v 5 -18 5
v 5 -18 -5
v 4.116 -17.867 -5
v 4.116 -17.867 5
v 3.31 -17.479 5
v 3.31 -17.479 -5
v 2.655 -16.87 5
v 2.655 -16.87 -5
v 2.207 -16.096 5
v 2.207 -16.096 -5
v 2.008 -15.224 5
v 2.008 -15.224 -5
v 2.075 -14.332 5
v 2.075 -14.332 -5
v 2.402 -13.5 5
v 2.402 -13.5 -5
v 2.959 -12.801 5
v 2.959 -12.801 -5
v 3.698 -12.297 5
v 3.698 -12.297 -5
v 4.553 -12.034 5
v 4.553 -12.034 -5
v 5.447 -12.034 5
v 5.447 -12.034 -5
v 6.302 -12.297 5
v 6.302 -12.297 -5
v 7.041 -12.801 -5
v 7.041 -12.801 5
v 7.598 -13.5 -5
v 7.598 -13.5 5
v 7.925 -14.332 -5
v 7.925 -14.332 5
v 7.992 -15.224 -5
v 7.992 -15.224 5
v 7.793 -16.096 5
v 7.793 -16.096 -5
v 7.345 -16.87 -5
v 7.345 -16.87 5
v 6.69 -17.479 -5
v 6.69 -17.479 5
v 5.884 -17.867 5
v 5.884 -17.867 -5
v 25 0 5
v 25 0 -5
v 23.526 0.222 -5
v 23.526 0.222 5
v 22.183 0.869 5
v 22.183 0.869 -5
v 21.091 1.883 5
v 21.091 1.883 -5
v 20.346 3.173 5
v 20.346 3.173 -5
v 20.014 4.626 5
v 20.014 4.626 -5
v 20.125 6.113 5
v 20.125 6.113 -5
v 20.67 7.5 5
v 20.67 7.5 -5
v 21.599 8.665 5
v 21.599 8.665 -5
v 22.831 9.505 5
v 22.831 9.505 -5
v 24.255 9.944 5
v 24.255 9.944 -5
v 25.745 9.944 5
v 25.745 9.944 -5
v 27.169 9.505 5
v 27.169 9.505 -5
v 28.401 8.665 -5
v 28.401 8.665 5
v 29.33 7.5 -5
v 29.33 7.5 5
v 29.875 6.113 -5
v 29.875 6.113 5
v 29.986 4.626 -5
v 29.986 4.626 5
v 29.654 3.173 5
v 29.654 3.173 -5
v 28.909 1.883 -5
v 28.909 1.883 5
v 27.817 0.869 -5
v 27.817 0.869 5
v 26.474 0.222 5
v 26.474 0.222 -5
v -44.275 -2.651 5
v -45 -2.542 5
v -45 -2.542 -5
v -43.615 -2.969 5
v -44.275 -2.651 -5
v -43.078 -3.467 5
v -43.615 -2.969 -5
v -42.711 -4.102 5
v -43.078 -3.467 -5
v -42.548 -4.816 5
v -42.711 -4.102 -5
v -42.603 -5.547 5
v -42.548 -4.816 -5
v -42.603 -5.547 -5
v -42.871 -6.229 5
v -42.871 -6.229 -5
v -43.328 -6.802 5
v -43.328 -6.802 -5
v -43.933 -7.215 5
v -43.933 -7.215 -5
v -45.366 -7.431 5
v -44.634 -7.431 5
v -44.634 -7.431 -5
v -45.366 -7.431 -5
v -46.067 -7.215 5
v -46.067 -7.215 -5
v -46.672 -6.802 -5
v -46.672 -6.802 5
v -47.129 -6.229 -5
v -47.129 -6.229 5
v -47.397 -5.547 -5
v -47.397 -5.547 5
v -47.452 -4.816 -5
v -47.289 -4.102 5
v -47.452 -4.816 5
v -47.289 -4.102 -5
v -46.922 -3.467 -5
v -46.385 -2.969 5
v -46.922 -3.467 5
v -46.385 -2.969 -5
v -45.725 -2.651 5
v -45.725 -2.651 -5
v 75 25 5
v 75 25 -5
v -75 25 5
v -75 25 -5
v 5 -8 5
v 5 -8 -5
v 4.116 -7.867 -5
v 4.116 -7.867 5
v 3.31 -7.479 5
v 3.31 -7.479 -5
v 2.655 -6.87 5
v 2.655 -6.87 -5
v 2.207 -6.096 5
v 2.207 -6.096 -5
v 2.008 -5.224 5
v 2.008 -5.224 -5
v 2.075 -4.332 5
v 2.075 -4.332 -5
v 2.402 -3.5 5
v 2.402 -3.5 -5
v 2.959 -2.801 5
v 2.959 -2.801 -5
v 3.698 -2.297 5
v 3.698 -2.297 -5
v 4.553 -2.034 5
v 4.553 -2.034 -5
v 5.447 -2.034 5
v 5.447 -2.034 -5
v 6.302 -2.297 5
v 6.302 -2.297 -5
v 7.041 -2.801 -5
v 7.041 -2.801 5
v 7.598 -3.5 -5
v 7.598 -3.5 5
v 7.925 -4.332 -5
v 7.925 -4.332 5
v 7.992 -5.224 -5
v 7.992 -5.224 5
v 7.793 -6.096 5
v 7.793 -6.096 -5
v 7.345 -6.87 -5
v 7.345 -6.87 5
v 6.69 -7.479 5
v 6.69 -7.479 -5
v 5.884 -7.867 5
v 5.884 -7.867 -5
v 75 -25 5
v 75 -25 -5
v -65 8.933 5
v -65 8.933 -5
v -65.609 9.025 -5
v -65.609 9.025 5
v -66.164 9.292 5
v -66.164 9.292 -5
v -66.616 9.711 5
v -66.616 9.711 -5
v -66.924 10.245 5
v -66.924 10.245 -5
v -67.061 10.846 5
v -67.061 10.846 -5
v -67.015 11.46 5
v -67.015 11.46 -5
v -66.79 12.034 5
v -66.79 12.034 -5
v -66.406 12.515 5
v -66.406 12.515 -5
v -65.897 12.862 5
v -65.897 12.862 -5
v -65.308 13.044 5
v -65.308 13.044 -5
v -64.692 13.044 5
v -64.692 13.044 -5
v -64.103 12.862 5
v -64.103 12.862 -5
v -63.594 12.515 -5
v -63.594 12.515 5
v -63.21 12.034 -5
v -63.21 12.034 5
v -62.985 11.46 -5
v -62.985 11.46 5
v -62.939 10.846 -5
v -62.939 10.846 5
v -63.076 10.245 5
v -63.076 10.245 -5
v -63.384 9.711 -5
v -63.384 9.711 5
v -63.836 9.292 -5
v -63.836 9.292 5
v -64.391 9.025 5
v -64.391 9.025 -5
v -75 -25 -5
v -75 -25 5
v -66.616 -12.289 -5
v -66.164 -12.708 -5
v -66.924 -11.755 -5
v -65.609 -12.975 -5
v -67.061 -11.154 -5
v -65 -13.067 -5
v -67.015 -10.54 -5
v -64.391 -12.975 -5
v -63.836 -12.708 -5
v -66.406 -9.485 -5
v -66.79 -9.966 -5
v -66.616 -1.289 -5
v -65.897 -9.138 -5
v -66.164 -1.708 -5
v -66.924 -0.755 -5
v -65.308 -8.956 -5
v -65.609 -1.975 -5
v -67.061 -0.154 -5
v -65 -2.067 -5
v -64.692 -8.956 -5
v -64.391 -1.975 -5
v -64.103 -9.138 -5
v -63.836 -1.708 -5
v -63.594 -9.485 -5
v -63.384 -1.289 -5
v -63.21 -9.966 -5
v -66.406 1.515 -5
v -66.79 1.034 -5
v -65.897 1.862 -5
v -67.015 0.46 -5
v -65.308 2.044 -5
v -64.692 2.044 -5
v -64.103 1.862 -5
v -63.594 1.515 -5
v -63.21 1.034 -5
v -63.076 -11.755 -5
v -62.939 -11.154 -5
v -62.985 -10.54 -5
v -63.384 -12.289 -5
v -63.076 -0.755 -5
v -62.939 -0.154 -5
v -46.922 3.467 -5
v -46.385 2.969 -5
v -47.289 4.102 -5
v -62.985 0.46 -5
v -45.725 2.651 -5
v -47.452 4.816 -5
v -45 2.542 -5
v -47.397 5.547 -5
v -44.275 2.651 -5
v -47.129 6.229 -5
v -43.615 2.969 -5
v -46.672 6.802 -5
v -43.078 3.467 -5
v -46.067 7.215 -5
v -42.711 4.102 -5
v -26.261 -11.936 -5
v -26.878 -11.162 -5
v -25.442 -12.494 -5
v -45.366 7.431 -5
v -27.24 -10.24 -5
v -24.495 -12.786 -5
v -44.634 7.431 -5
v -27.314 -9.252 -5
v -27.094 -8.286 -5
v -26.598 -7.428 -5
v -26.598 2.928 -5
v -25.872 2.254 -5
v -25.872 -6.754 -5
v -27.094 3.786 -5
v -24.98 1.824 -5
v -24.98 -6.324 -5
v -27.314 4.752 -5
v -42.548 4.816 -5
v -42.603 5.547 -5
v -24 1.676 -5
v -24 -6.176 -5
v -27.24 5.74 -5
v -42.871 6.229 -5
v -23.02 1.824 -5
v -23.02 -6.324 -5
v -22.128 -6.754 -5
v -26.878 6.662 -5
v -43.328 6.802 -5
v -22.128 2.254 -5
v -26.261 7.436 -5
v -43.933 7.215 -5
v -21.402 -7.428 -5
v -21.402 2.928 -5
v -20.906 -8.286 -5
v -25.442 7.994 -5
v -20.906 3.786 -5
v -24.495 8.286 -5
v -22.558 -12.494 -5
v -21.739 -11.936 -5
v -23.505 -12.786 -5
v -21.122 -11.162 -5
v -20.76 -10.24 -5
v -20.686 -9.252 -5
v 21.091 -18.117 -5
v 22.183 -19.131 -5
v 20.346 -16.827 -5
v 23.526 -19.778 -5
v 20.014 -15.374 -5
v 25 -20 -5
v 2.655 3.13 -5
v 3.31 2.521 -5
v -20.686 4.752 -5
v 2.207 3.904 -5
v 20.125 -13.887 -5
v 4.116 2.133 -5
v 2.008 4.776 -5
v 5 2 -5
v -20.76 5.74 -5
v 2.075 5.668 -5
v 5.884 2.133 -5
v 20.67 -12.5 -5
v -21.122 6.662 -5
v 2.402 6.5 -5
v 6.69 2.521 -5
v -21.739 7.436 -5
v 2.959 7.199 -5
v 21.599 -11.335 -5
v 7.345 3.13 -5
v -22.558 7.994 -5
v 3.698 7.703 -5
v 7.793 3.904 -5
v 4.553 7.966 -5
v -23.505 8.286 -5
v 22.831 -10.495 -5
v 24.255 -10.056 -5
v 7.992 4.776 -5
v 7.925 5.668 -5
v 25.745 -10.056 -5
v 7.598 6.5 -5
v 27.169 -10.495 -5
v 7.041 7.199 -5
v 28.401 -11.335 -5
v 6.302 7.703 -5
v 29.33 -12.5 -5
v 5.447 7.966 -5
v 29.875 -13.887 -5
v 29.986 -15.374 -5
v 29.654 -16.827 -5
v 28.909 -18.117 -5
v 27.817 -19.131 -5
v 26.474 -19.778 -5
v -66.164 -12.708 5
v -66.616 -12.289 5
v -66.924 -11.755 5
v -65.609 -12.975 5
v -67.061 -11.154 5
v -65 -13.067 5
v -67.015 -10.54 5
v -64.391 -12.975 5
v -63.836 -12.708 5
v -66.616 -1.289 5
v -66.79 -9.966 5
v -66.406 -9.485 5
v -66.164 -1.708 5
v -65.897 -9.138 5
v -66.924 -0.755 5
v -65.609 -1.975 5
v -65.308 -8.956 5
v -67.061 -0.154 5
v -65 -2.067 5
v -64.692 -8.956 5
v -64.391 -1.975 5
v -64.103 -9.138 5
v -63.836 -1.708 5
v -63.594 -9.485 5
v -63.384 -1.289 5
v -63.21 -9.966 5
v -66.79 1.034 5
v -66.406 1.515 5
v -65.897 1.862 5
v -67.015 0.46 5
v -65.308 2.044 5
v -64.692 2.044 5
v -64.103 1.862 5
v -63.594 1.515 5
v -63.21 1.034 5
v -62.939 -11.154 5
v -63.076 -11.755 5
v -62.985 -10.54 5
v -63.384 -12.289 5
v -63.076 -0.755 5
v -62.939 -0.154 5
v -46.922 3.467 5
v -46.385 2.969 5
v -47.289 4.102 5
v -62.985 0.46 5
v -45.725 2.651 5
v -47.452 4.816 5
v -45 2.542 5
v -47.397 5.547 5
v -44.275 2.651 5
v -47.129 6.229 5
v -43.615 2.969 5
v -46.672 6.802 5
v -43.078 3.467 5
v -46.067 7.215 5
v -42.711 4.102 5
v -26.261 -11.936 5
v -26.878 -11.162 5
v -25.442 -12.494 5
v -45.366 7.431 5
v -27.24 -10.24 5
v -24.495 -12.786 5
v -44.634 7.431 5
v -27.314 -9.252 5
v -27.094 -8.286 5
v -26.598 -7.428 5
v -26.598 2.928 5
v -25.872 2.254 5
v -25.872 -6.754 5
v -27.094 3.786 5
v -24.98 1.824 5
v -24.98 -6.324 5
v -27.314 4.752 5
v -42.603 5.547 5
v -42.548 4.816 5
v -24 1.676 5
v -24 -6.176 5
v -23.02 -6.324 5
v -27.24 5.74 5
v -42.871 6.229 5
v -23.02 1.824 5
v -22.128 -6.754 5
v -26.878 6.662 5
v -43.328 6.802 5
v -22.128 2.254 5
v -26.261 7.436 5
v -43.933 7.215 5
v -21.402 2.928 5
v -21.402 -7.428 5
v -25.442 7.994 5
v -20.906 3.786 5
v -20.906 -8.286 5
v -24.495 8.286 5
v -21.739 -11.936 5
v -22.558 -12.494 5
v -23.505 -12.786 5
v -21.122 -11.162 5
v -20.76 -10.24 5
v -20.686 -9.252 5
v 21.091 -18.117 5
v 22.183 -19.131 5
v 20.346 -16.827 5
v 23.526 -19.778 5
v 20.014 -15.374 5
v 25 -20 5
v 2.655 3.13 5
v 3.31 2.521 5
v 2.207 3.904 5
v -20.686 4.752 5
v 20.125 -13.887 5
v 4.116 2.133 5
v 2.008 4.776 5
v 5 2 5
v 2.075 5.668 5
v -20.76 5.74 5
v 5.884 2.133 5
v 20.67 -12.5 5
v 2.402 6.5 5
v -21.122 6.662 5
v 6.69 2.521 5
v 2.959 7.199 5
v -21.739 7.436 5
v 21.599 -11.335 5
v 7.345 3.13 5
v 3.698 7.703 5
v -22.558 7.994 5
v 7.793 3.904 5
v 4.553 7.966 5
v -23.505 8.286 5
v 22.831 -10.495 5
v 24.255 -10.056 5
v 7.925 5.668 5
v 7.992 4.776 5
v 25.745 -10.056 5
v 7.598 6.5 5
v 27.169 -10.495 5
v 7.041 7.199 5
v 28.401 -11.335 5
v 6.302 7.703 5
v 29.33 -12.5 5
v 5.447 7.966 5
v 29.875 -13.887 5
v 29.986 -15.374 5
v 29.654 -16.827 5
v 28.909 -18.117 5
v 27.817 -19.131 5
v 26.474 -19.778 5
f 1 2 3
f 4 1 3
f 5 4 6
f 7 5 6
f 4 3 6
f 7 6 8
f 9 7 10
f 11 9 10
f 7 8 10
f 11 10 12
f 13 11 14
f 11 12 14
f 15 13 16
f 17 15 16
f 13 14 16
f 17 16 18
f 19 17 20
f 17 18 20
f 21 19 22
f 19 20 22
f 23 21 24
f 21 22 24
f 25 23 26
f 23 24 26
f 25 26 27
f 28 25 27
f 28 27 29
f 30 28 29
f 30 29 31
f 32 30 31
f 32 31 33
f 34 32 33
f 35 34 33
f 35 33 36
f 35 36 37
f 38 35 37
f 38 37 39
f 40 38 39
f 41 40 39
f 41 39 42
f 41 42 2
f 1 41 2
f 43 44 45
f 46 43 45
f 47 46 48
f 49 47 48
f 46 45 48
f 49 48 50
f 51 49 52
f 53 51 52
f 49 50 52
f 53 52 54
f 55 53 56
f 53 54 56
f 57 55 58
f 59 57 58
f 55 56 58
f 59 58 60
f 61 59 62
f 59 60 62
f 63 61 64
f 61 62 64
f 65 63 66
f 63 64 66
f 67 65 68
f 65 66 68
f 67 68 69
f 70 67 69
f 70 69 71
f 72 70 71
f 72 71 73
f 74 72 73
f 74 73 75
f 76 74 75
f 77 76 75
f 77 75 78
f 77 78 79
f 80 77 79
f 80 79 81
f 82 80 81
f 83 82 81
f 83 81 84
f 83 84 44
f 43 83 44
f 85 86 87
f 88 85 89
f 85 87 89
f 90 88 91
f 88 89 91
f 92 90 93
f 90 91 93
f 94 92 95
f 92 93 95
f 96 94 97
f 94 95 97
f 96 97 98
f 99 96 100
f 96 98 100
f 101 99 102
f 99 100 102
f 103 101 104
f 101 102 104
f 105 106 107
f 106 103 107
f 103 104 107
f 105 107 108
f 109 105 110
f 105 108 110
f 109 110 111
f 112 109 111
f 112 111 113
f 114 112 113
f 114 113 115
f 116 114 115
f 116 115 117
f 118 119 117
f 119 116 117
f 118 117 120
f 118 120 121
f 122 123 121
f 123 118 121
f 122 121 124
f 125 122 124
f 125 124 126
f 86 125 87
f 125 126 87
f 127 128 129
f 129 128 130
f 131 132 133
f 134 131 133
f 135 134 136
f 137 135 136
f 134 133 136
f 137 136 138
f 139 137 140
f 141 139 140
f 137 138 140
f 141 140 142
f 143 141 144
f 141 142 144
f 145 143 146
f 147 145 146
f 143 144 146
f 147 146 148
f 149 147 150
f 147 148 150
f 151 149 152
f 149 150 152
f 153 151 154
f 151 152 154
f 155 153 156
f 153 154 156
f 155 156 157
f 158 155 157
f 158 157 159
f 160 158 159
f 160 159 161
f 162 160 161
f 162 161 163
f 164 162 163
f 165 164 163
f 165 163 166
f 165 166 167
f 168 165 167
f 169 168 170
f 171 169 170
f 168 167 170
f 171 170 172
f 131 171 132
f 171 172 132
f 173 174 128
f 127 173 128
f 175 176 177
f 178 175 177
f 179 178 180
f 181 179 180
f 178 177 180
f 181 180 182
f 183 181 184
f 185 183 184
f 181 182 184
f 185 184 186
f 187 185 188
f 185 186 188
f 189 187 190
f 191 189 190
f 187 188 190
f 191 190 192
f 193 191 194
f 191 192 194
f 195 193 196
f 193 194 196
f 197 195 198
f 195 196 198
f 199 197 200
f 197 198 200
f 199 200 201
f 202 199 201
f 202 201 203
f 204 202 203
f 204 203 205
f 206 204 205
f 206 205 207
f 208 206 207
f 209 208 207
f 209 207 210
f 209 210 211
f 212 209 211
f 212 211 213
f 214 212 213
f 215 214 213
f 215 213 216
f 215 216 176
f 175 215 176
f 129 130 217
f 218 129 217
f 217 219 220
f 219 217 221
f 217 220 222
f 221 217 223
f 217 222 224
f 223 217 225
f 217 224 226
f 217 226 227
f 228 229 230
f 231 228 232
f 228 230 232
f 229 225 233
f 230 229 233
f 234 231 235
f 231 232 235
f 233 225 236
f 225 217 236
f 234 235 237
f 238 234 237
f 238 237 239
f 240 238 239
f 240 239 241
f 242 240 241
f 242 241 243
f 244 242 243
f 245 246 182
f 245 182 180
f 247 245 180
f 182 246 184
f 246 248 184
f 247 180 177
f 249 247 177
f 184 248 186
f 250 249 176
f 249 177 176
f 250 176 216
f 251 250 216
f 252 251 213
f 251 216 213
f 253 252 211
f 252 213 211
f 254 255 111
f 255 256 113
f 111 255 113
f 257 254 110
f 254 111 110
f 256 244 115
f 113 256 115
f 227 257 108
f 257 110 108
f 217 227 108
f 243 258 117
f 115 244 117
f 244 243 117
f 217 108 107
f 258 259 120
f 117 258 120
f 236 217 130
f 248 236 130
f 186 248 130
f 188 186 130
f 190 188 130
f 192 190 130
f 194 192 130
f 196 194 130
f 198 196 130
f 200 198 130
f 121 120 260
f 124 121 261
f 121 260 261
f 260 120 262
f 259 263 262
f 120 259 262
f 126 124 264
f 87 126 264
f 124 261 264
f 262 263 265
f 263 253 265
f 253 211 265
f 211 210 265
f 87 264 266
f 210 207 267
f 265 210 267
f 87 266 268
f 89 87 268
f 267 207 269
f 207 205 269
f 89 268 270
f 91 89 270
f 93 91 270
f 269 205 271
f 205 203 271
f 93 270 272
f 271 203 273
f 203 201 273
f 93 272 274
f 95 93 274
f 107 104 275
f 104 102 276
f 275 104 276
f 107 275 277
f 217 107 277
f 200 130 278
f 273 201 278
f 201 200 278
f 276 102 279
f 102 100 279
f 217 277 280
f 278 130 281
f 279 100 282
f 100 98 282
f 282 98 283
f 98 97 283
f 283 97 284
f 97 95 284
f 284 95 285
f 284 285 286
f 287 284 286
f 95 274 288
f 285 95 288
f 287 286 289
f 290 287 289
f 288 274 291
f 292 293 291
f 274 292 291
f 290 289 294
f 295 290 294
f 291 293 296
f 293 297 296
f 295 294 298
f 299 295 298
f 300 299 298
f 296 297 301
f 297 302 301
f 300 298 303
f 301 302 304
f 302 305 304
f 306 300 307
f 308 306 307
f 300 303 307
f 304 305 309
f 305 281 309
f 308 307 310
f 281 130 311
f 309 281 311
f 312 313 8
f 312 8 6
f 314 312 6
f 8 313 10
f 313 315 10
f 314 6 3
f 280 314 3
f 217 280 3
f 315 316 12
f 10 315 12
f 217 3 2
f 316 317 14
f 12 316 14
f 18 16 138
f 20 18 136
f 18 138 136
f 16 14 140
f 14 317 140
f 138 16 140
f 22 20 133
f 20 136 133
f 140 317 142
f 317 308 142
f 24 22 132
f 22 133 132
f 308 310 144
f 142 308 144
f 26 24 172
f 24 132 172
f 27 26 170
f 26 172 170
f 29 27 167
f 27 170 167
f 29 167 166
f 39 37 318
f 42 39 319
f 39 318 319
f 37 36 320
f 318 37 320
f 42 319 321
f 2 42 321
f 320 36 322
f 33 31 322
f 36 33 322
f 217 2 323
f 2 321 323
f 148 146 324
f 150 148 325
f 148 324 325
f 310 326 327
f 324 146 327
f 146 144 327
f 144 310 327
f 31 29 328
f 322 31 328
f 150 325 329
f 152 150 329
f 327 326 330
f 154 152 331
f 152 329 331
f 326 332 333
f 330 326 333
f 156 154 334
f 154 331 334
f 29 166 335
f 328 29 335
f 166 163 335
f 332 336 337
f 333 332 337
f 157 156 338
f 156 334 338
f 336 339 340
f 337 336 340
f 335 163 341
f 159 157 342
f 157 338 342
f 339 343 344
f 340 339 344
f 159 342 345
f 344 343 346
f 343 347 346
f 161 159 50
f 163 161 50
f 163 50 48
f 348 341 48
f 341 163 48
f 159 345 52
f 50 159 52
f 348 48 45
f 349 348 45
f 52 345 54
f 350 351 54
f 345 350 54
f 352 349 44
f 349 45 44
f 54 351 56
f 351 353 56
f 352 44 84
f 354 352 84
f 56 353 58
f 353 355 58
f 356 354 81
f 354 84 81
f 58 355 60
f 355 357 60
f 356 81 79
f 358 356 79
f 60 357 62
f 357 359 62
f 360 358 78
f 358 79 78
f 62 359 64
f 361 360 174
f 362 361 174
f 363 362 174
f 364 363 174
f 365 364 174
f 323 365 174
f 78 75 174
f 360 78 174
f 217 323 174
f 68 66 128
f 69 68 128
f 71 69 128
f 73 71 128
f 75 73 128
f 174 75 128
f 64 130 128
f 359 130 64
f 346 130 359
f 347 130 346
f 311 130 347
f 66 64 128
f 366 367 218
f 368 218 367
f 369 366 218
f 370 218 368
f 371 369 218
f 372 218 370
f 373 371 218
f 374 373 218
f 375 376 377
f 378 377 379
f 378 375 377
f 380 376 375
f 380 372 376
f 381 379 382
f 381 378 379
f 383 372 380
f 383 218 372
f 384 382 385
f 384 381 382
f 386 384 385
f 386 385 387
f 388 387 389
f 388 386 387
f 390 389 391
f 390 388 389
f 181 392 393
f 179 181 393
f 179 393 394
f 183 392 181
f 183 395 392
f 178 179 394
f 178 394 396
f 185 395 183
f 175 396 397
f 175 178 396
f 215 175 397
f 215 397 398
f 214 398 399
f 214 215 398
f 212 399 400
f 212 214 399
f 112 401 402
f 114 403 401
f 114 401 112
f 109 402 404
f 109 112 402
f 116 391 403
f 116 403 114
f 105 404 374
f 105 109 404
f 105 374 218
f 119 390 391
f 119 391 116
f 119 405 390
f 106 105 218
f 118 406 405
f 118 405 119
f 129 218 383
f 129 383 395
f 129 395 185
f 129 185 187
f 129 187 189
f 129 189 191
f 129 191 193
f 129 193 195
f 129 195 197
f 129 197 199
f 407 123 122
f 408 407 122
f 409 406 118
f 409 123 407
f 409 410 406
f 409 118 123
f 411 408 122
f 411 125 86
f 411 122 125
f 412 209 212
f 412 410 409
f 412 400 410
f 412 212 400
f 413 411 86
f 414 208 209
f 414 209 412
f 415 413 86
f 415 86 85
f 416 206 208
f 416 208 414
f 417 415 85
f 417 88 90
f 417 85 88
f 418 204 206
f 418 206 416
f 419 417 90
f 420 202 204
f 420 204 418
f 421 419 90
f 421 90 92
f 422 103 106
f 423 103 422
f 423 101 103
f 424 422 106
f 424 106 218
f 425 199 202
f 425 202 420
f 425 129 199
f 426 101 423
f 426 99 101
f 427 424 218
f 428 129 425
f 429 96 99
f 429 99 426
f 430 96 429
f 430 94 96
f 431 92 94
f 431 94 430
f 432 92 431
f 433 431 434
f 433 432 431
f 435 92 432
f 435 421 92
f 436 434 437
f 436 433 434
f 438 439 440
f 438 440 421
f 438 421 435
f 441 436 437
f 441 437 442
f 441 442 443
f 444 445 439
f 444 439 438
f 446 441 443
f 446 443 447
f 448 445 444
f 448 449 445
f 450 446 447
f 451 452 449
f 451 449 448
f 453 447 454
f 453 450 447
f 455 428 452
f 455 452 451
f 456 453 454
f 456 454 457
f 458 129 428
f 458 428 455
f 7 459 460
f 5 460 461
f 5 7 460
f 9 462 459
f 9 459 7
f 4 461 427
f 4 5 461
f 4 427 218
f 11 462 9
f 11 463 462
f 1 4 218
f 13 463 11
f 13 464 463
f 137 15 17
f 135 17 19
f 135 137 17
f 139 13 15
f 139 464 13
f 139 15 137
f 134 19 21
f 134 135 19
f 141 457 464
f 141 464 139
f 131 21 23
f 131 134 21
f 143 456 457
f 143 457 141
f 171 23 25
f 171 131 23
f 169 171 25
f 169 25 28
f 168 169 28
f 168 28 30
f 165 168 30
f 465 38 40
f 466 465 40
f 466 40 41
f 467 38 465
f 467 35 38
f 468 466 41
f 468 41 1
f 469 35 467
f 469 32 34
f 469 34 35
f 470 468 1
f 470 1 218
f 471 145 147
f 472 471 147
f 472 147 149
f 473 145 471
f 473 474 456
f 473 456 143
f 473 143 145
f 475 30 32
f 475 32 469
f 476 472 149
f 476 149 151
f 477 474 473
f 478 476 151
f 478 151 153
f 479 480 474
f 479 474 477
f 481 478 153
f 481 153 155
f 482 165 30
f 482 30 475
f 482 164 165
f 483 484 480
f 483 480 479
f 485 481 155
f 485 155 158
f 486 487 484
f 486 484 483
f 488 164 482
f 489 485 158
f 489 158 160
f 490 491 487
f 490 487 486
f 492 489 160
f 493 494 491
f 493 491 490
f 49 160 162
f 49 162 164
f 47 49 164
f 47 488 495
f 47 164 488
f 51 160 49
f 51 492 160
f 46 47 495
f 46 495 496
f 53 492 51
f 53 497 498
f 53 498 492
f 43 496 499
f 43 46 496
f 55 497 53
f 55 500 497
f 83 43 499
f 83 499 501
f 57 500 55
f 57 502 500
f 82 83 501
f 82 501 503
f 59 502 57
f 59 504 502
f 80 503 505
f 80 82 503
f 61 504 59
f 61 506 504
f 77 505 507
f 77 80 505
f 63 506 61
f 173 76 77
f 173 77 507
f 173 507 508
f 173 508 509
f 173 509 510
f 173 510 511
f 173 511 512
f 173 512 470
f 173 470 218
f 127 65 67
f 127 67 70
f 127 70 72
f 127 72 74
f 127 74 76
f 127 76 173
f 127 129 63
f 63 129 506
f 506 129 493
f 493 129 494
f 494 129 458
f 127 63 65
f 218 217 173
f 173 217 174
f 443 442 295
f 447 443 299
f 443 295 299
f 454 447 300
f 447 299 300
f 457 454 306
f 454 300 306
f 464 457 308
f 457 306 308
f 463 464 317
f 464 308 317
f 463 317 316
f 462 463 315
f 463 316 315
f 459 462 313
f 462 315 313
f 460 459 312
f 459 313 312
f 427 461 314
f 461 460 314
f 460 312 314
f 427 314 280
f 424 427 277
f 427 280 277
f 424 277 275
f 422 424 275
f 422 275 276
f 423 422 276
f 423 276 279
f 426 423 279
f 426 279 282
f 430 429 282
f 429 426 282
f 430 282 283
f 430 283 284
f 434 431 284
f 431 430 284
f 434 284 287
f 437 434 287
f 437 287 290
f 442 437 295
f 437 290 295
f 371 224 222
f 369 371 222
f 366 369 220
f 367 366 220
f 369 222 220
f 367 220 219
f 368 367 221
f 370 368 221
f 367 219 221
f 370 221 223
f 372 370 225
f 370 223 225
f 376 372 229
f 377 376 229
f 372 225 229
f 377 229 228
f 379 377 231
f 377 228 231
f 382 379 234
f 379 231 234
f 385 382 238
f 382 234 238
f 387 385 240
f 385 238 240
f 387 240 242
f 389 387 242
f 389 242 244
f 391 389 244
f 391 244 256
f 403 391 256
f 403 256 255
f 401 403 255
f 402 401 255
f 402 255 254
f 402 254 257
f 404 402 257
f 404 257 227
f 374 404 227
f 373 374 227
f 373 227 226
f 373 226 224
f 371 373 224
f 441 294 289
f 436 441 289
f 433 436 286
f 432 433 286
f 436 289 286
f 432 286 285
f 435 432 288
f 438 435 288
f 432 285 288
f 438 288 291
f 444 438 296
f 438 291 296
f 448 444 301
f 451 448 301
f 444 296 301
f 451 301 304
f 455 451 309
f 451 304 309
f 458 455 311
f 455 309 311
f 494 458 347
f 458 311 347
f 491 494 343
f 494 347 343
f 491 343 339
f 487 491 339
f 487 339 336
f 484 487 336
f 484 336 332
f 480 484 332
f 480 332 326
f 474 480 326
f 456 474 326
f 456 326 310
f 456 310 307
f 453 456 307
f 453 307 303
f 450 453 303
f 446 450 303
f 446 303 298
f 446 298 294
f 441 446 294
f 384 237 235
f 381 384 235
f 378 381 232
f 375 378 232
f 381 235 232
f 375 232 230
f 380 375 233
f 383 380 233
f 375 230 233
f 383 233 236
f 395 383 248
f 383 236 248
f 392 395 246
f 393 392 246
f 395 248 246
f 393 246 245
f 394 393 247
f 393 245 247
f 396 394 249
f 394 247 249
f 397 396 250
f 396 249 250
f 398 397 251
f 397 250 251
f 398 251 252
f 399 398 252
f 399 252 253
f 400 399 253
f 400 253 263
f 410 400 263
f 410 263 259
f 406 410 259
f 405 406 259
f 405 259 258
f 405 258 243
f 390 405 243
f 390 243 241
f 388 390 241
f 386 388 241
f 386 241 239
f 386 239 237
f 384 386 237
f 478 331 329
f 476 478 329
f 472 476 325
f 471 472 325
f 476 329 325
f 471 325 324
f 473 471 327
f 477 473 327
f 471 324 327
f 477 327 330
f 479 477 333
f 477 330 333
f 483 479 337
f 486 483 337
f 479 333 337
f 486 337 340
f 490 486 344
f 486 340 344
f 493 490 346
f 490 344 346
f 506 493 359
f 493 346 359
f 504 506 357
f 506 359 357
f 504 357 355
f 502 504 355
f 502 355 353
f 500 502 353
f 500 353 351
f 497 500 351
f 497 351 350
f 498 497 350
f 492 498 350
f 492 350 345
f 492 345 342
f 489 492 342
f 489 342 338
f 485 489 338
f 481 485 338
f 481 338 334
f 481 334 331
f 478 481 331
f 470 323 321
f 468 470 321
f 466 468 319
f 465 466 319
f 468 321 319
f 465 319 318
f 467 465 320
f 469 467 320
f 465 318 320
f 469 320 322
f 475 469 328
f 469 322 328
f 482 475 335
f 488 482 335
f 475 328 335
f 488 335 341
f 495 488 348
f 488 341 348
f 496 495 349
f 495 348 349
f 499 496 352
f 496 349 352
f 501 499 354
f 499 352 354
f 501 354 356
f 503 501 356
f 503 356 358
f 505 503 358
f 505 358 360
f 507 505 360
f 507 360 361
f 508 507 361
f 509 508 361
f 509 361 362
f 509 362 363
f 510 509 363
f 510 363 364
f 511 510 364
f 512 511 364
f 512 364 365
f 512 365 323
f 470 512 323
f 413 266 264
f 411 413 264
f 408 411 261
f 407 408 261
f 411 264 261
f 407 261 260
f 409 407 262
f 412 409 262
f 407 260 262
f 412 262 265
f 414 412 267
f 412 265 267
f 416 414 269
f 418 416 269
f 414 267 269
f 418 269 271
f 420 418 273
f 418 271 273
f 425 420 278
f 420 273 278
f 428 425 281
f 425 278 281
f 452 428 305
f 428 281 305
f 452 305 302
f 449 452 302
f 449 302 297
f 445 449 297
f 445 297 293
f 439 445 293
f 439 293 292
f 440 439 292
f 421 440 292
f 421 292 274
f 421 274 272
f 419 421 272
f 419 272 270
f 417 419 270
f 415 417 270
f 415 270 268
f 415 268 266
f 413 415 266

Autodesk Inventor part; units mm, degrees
ref_plane "YZ Plane" through (0, 0, 0) normal (1, 0, 0) x (0, 1, 0)
ref_plane "XY Plane" through (0, 0, 0) normal (0, 0, 1) x (1, 0, 0)
sketch "Sketch2" plane through (0, 0, 0) normal (0, 0, 1) x (1, 0, 0)
  line L0 (-75, -25) -> (75, -25)
  line L1 (75, -25) -> (75, 25)
  line L2 (75, 25) -> (-75, 25)
  line L3 (-75, 25) -> (-75, -25)
  line L4 (-75, -25) -> (75, 25) construction
  line L5 (75, -25) -> (-75, 25) construction
  point P0 (0, 0)
  dimension "d1" = 150
  dimension "d2" = 50
extrude "Extrusion1" add sketch "Sketch2" along normal mid plane 10
sketch "Sketch3" plane through (0, 0, 5) normal (0, 0, 1) x (1, 0, 0)
  line L0 (-75, 25) -> (-75, -25) projected
  line L1 (75, 25) -> (-75, 25) projected
  point P0 (0, 0)
  point P1 (-65, 0)
  dimension "d40" = 10
  dimension "d43" = 25
hole "Hole1" at (-65, 0, 5) direction (0, 0, -1) diameter 4.134 depth 14.2 tip angle 118 thread size "M5x0.8" class "6H" standard "TS profile"
sketch "Sketch4" plane through (0, 0, 5) normal (0, 0, 1) x (1, 0, 0)
  line L0 (-75, 25) -> (-75, -25) projected
  line L1 (75, 25) -> (-75, 25) projected
  point P0 (0, 0)
  point P1 (-45, 5)
  dimension "d41" = 30
  dimension "d42" = 20
hole "Hole2" at (-45, 5, 5) direction (0, 0, -1) diameter 4.917 depth 17.1 tip angle 118 thread size "M6x1" class "6H" standard "TS profile"
sketch "Sketch5" plane through (0, 0, 5) normal (0, 0, 1) x (1, 0, 0)
  line L0 (-75, 25) -> (-75, -25) projected
  line L1 (75, 25) -> (-75, 25) projected
  point P0 (0, 0)
  point P1 (-24, 5)
  dimension "d44" = 51
  dimension "d45" = 20
hole "Hole3" at (-24, 5, 5) direction (0, 0, -1) diameter 6.647 depth 22.2 tip angle 118 thread size "M8x1.25" class "6H" standard "TS profile"
sketch "Sketch6" plane through (0, 0, 5) normal (0, 0, 1) x (1, 0, 0)
  line L0 (-75, 25) -> (-75, -25) projected
  line L1 (75, 25) -> (-75, 25) projected
  point P0 (0, 0)
  point P1 (5, 5)
  dimension "d46" = 80
  dimension "d47" = 20
hole "Hole4" at (5, 5, 5) direction (0, 0, -1) diameter 6 depth 14.2 tip angle 118
sketch "Sketch7" plane through (0, 0, 5) normal (0, 0, 1) x (1, 0, 0)
  line L0 (-75, 25) -> (-75, -25) projected
  line L1 (75, 25) -> (-75, 25) projected
  point P0 (0, 0)
  point P1 (25, 5)
  dimension "d48" = 100
  dimension "d49" = 20
hole "Hole5" at (25, 5, 5) direction (0, 0, -1) diameter 10 depth 14.2 tip angle 118
pattern_linear "Rectangular Pattern1" count 3 spacing 11 along (0, -1, 0) of "Hole1" first direction both ways yes
mirror "Mirror1" about plane through (0, 0, 0) normal (0, 1, 0) of "Hole2"
pattern_linear "Rectangular Pattern2" count 3 spacing 10 along (0, -1, 0) of "Hole4"
ref_plane "Work Plane1" through (0, -2.25, 0) normal (0, 1, 0) x (-1, 0, 0)
mirror "Mirror3" about plane through (0, -2.25, 0) normal (0, 1, 0) of "Hole3"
pattern_linear "Rectangular Pattern3" count 2 spacing 20 along (0, -1, 0) of "Hole5"
ref_plane "Work Plane2" through (0, -2.25, 0) normal (0, 1, 0) x (-1, 0, 0)
properties part number "홀간 거리 확인 파트-4" material "SS400"
